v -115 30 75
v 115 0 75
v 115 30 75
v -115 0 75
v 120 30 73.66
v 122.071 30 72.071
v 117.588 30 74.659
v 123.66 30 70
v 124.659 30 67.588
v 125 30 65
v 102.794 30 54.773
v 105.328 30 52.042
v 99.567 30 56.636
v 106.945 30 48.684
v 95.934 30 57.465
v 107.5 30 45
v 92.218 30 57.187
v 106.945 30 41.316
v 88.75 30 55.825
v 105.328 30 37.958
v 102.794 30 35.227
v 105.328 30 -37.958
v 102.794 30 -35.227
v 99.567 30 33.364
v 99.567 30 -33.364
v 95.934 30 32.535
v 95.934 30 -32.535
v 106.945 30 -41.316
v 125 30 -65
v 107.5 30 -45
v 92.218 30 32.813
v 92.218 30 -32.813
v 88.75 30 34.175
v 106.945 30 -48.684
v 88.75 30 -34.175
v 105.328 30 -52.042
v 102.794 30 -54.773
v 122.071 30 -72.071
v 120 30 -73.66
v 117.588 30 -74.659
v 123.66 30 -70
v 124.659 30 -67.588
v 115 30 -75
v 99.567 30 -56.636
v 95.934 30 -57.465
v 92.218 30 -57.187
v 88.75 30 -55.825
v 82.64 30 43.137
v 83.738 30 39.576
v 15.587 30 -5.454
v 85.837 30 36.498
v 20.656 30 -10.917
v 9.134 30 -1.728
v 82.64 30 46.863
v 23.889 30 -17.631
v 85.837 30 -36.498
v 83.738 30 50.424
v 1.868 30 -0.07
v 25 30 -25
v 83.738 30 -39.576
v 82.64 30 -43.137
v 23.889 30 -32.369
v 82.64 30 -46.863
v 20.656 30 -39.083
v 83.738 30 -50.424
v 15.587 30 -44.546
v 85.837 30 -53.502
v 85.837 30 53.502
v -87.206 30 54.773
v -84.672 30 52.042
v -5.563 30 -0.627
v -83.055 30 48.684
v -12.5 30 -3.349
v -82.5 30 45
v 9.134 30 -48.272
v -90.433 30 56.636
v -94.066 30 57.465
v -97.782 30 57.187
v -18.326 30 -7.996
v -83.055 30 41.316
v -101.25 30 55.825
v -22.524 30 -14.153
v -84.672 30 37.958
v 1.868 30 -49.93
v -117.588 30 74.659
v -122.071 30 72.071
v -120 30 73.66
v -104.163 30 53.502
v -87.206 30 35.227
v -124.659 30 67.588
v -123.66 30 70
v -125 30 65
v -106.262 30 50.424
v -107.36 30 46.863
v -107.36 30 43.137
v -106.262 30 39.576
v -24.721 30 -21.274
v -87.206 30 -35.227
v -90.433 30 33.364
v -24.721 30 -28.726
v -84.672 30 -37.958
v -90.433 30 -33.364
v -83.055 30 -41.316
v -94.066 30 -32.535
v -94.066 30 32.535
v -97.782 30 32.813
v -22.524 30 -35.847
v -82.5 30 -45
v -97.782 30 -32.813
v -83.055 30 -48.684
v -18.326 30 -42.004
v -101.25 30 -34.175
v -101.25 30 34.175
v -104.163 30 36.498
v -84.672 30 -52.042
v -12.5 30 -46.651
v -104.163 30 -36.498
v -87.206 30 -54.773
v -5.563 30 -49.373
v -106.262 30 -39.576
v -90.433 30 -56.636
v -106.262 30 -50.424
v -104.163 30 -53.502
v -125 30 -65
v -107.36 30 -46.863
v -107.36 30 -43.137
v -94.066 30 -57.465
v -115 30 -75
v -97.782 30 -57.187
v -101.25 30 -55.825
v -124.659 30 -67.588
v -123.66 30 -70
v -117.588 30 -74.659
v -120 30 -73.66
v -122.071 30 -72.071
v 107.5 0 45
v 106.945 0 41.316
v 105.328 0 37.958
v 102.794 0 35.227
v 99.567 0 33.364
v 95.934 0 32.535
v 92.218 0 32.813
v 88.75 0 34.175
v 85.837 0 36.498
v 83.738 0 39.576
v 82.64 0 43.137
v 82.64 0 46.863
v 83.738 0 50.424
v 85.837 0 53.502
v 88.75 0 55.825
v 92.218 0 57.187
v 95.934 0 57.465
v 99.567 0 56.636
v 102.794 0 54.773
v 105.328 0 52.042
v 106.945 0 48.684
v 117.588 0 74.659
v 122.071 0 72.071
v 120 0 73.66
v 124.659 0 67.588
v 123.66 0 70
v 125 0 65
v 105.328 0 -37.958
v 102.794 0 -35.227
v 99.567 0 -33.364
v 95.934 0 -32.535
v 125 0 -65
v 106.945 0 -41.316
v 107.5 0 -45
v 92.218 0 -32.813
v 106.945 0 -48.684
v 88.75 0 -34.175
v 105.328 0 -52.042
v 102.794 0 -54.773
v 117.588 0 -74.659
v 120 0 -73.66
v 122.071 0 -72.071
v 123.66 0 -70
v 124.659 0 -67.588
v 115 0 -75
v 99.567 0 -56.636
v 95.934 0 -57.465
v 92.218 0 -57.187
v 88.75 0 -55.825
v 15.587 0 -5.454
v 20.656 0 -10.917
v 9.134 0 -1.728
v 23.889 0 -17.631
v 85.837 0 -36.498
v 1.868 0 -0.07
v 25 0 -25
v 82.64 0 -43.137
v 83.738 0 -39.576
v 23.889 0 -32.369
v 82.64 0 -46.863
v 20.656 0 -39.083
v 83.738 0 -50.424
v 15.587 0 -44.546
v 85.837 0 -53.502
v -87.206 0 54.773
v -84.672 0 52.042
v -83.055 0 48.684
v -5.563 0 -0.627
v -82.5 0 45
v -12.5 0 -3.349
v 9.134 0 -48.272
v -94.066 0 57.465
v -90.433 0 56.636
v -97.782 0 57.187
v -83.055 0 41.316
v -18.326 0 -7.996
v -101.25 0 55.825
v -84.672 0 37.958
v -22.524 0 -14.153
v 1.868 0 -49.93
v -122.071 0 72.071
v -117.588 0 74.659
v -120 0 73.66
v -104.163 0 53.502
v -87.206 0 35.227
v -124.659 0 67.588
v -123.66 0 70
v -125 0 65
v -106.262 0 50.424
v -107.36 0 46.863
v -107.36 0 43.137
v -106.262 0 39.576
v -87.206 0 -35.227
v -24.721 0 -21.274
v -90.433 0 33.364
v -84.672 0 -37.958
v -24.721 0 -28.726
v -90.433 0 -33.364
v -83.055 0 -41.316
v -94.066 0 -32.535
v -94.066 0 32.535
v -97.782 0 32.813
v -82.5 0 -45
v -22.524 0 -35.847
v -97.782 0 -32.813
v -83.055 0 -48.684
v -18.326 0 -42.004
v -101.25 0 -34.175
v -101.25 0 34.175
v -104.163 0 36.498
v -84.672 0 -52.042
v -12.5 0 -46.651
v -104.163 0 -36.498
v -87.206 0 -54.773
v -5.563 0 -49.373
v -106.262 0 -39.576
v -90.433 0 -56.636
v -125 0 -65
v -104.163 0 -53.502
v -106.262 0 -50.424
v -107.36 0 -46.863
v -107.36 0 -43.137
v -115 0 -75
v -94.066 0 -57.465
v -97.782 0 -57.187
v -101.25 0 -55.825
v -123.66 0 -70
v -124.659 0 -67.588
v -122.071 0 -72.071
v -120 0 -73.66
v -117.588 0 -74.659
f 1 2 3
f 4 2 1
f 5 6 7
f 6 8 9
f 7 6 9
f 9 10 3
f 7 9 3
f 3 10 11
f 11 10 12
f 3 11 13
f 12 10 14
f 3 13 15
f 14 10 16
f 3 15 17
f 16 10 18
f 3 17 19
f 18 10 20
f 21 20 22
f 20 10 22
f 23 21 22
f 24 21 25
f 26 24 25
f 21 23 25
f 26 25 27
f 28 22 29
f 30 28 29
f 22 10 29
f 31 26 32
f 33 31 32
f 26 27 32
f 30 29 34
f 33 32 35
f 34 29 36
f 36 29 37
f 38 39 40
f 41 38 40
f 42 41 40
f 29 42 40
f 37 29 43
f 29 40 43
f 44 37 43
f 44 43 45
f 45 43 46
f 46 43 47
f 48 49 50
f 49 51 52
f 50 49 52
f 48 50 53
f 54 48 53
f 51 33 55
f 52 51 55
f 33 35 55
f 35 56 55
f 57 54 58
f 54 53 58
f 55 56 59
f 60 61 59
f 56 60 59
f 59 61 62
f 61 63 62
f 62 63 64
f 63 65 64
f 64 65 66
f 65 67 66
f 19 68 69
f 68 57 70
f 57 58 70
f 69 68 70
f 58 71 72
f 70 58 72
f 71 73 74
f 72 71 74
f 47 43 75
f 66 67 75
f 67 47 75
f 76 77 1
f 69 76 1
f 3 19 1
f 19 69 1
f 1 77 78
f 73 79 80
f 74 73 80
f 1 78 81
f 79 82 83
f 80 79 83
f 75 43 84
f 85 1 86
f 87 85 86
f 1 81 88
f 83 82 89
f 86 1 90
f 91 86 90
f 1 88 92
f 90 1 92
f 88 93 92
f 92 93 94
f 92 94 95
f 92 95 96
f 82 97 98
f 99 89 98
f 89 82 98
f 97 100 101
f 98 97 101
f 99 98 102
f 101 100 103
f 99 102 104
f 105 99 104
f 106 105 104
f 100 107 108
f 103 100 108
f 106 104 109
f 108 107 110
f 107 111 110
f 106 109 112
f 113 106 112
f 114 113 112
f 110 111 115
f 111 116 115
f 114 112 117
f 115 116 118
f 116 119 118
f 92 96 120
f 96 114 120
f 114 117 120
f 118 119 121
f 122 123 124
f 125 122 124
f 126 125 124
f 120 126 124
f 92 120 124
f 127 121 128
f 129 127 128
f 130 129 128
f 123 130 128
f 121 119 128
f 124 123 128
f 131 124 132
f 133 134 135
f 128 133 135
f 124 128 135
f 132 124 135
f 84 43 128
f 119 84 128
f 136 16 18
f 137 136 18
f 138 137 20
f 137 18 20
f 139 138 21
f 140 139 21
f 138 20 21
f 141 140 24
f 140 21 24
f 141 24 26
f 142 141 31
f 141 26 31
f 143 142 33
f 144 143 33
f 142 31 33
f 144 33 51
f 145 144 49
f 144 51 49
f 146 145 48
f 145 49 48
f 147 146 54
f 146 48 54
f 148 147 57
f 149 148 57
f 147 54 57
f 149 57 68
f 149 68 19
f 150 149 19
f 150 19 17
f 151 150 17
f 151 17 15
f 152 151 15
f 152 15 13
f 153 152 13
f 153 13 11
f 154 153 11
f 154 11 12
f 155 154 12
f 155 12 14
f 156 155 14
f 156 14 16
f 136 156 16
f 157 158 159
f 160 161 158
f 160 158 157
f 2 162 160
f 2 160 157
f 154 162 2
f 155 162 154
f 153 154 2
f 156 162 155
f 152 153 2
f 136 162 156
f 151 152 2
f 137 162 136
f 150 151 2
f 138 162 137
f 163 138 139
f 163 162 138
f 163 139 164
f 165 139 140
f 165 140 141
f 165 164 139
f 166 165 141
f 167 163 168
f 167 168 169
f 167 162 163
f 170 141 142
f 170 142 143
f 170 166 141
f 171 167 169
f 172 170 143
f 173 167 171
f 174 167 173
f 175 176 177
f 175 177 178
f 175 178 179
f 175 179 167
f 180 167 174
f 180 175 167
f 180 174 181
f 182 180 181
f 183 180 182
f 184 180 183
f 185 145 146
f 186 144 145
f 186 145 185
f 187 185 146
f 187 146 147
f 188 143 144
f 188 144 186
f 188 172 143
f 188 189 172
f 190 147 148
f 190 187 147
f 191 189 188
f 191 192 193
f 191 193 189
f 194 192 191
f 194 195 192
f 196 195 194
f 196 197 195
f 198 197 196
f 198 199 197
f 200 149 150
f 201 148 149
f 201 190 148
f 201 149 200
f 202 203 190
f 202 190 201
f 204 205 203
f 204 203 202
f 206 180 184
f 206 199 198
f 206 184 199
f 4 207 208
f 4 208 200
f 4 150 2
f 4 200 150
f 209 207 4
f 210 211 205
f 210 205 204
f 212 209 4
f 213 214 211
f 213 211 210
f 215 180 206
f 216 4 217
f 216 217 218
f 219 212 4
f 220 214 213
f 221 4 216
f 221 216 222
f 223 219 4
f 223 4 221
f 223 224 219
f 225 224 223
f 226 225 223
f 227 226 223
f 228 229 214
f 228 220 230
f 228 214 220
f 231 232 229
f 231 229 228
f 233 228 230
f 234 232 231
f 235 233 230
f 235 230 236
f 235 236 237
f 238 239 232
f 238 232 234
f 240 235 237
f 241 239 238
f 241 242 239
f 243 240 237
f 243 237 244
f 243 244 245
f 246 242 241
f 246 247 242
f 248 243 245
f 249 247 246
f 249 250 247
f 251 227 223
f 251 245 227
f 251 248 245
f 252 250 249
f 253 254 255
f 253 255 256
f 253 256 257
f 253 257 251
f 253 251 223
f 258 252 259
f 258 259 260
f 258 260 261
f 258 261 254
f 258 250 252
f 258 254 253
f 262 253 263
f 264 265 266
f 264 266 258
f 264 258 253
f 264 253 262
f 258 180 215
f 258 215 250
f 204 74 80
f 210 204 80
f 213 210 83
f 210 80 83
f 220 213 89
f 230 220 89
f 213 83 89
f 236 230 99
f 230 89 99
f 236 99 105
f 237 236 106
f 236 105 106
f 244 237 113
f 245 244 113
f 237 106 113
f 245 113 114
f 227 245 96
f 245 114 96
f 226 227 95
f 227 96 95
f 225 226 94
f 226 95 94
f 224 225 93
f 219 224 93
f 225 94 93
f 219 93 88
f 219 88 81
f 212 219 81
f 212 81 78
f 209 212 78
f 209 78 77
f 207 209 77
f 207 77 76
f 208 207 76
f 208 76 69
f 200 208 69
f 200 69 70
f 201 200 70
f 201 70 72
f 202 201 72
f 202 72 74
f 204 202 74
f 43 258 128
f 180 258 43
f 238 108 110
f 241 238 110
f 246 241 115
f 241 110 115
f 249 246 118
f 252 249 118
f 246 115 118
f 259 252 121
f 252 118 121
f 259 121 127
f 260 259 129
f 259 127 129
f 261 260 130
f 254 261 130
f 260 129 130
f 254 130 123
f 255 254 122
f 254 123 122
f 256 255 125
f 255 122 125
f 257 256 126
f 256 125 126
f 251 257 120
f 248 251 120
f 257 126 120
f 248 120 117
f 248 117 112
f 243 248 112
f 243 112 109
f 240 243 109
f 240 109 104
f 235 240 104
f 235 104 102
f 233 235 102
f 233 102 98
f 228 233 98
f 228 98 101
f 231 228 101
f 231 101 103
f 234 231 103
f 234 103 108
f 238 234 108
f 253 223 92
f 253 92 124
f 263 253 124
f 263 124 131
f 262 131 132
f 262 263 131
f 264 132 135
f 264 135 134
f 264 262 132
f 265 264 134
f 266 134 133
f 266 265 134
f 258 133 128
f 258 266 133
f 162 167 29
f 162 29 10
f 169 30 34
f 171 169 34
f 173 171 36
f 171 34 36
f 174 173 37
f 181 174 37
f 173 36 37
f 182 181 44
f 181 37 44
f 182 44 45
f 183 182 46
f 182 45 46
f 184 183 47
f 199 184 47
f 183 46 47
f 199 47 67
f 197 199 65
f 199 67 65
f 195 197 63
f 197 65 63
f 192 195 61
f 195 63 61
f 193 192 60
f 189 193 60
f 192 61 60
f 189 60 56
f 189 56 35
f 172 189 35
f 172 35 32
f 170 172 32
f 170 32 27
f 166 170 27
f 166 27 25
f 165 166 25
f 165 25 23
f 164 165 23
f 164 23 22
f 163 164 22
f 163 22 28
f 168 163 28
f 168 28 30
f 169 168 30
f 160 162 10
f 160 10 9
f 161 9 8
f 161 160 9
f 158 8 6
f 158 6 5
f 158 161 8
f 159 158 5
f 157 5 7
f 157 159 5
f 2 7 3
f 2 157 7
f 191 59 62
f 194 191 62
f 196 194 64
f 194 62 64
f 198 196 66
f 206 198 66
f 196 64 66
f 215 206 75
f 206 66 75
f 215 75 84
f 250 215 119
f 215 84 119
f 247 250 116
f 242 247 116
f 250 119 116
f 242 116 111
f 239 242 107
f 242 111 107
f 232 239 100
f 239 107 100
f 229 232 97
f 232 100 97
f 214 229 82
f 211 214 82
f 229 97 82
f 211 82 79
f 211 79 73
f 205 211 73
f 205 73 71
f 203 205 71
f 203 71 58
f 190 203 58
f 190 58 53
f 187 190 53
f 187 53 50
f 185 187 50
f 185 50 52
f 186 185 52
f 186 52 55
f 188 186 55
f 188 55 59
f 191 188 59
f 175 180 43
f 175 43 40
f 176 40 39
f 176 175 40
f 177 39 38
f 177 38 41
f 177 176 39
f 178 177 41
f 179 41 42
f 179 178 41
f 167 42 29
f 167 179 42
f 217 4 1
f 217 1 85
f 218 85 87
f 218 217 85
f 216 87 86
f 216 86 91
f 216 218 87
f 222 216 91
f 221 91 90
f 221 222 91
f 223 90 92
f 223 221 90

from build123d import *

# Parameters (mm, degrees)
BOSS_EXTRUDE1_DEPTH = 30
SKETCH2_R           = 25
SKETCH2_R_2         = 12.5
CUT_EXTRUDE1_DEPTH  = 31


with BuildPart() as part:
    # Sketch1 → Boss-Extrude1 (new body)
    with BuildSketch(Plane(origin=(0, 0, 0), x_dir=(1, 0, 0), z_dir=(0, 1, 0))):
        with BuildLine():
            Line((115, -75), (-115, -75))
            ThreePointArc((-115, -75), (-122.071067812, -72.071067812), (-125, -65))
            Line((-125, -65), (-125, 65))
            ThreePointArc((-125, 65), (-122.071067812, 72.071067812), (-115, 75))
            Line((-115, 75), (115, 75))
            ThreePointArc((115, 75), (122.071067812, 72.071067812), (125, 65))
            Line((125, 65), (125, -65))
            ThreePointArc((125, -65), (122.071067812, -72.071067812), (115, -75))
        make_face()
    extrude(amount=BOSS_EXTRUDE1_DEPTH)

    # Sketch2 → Cut-Extrude1 (cut, through all)
    with BuildSketch(Plane(origin=(0, 30, 0), x_dir=(1, 0, 0), z_dir=(0, 1, 0))):
        with Locations((0, 25)):
            Circle(SKETCH2_R)
        with Locations((-95, 45)):
            Circle(SKETCH2_R_2)
        with Locations((95, 45)):
            Circle(SKETCH2_R_2)
        with Locations((95, -45)):
            Circle(SKETCH2_R_2)
        with Locations((-95, -45)):
            Circle(SKETCH2_R_2)
    extrude(amount=-CUT_EXTRUDE1_DEPTH, mode=Mode.SUBTRACT)


solid = part.part
